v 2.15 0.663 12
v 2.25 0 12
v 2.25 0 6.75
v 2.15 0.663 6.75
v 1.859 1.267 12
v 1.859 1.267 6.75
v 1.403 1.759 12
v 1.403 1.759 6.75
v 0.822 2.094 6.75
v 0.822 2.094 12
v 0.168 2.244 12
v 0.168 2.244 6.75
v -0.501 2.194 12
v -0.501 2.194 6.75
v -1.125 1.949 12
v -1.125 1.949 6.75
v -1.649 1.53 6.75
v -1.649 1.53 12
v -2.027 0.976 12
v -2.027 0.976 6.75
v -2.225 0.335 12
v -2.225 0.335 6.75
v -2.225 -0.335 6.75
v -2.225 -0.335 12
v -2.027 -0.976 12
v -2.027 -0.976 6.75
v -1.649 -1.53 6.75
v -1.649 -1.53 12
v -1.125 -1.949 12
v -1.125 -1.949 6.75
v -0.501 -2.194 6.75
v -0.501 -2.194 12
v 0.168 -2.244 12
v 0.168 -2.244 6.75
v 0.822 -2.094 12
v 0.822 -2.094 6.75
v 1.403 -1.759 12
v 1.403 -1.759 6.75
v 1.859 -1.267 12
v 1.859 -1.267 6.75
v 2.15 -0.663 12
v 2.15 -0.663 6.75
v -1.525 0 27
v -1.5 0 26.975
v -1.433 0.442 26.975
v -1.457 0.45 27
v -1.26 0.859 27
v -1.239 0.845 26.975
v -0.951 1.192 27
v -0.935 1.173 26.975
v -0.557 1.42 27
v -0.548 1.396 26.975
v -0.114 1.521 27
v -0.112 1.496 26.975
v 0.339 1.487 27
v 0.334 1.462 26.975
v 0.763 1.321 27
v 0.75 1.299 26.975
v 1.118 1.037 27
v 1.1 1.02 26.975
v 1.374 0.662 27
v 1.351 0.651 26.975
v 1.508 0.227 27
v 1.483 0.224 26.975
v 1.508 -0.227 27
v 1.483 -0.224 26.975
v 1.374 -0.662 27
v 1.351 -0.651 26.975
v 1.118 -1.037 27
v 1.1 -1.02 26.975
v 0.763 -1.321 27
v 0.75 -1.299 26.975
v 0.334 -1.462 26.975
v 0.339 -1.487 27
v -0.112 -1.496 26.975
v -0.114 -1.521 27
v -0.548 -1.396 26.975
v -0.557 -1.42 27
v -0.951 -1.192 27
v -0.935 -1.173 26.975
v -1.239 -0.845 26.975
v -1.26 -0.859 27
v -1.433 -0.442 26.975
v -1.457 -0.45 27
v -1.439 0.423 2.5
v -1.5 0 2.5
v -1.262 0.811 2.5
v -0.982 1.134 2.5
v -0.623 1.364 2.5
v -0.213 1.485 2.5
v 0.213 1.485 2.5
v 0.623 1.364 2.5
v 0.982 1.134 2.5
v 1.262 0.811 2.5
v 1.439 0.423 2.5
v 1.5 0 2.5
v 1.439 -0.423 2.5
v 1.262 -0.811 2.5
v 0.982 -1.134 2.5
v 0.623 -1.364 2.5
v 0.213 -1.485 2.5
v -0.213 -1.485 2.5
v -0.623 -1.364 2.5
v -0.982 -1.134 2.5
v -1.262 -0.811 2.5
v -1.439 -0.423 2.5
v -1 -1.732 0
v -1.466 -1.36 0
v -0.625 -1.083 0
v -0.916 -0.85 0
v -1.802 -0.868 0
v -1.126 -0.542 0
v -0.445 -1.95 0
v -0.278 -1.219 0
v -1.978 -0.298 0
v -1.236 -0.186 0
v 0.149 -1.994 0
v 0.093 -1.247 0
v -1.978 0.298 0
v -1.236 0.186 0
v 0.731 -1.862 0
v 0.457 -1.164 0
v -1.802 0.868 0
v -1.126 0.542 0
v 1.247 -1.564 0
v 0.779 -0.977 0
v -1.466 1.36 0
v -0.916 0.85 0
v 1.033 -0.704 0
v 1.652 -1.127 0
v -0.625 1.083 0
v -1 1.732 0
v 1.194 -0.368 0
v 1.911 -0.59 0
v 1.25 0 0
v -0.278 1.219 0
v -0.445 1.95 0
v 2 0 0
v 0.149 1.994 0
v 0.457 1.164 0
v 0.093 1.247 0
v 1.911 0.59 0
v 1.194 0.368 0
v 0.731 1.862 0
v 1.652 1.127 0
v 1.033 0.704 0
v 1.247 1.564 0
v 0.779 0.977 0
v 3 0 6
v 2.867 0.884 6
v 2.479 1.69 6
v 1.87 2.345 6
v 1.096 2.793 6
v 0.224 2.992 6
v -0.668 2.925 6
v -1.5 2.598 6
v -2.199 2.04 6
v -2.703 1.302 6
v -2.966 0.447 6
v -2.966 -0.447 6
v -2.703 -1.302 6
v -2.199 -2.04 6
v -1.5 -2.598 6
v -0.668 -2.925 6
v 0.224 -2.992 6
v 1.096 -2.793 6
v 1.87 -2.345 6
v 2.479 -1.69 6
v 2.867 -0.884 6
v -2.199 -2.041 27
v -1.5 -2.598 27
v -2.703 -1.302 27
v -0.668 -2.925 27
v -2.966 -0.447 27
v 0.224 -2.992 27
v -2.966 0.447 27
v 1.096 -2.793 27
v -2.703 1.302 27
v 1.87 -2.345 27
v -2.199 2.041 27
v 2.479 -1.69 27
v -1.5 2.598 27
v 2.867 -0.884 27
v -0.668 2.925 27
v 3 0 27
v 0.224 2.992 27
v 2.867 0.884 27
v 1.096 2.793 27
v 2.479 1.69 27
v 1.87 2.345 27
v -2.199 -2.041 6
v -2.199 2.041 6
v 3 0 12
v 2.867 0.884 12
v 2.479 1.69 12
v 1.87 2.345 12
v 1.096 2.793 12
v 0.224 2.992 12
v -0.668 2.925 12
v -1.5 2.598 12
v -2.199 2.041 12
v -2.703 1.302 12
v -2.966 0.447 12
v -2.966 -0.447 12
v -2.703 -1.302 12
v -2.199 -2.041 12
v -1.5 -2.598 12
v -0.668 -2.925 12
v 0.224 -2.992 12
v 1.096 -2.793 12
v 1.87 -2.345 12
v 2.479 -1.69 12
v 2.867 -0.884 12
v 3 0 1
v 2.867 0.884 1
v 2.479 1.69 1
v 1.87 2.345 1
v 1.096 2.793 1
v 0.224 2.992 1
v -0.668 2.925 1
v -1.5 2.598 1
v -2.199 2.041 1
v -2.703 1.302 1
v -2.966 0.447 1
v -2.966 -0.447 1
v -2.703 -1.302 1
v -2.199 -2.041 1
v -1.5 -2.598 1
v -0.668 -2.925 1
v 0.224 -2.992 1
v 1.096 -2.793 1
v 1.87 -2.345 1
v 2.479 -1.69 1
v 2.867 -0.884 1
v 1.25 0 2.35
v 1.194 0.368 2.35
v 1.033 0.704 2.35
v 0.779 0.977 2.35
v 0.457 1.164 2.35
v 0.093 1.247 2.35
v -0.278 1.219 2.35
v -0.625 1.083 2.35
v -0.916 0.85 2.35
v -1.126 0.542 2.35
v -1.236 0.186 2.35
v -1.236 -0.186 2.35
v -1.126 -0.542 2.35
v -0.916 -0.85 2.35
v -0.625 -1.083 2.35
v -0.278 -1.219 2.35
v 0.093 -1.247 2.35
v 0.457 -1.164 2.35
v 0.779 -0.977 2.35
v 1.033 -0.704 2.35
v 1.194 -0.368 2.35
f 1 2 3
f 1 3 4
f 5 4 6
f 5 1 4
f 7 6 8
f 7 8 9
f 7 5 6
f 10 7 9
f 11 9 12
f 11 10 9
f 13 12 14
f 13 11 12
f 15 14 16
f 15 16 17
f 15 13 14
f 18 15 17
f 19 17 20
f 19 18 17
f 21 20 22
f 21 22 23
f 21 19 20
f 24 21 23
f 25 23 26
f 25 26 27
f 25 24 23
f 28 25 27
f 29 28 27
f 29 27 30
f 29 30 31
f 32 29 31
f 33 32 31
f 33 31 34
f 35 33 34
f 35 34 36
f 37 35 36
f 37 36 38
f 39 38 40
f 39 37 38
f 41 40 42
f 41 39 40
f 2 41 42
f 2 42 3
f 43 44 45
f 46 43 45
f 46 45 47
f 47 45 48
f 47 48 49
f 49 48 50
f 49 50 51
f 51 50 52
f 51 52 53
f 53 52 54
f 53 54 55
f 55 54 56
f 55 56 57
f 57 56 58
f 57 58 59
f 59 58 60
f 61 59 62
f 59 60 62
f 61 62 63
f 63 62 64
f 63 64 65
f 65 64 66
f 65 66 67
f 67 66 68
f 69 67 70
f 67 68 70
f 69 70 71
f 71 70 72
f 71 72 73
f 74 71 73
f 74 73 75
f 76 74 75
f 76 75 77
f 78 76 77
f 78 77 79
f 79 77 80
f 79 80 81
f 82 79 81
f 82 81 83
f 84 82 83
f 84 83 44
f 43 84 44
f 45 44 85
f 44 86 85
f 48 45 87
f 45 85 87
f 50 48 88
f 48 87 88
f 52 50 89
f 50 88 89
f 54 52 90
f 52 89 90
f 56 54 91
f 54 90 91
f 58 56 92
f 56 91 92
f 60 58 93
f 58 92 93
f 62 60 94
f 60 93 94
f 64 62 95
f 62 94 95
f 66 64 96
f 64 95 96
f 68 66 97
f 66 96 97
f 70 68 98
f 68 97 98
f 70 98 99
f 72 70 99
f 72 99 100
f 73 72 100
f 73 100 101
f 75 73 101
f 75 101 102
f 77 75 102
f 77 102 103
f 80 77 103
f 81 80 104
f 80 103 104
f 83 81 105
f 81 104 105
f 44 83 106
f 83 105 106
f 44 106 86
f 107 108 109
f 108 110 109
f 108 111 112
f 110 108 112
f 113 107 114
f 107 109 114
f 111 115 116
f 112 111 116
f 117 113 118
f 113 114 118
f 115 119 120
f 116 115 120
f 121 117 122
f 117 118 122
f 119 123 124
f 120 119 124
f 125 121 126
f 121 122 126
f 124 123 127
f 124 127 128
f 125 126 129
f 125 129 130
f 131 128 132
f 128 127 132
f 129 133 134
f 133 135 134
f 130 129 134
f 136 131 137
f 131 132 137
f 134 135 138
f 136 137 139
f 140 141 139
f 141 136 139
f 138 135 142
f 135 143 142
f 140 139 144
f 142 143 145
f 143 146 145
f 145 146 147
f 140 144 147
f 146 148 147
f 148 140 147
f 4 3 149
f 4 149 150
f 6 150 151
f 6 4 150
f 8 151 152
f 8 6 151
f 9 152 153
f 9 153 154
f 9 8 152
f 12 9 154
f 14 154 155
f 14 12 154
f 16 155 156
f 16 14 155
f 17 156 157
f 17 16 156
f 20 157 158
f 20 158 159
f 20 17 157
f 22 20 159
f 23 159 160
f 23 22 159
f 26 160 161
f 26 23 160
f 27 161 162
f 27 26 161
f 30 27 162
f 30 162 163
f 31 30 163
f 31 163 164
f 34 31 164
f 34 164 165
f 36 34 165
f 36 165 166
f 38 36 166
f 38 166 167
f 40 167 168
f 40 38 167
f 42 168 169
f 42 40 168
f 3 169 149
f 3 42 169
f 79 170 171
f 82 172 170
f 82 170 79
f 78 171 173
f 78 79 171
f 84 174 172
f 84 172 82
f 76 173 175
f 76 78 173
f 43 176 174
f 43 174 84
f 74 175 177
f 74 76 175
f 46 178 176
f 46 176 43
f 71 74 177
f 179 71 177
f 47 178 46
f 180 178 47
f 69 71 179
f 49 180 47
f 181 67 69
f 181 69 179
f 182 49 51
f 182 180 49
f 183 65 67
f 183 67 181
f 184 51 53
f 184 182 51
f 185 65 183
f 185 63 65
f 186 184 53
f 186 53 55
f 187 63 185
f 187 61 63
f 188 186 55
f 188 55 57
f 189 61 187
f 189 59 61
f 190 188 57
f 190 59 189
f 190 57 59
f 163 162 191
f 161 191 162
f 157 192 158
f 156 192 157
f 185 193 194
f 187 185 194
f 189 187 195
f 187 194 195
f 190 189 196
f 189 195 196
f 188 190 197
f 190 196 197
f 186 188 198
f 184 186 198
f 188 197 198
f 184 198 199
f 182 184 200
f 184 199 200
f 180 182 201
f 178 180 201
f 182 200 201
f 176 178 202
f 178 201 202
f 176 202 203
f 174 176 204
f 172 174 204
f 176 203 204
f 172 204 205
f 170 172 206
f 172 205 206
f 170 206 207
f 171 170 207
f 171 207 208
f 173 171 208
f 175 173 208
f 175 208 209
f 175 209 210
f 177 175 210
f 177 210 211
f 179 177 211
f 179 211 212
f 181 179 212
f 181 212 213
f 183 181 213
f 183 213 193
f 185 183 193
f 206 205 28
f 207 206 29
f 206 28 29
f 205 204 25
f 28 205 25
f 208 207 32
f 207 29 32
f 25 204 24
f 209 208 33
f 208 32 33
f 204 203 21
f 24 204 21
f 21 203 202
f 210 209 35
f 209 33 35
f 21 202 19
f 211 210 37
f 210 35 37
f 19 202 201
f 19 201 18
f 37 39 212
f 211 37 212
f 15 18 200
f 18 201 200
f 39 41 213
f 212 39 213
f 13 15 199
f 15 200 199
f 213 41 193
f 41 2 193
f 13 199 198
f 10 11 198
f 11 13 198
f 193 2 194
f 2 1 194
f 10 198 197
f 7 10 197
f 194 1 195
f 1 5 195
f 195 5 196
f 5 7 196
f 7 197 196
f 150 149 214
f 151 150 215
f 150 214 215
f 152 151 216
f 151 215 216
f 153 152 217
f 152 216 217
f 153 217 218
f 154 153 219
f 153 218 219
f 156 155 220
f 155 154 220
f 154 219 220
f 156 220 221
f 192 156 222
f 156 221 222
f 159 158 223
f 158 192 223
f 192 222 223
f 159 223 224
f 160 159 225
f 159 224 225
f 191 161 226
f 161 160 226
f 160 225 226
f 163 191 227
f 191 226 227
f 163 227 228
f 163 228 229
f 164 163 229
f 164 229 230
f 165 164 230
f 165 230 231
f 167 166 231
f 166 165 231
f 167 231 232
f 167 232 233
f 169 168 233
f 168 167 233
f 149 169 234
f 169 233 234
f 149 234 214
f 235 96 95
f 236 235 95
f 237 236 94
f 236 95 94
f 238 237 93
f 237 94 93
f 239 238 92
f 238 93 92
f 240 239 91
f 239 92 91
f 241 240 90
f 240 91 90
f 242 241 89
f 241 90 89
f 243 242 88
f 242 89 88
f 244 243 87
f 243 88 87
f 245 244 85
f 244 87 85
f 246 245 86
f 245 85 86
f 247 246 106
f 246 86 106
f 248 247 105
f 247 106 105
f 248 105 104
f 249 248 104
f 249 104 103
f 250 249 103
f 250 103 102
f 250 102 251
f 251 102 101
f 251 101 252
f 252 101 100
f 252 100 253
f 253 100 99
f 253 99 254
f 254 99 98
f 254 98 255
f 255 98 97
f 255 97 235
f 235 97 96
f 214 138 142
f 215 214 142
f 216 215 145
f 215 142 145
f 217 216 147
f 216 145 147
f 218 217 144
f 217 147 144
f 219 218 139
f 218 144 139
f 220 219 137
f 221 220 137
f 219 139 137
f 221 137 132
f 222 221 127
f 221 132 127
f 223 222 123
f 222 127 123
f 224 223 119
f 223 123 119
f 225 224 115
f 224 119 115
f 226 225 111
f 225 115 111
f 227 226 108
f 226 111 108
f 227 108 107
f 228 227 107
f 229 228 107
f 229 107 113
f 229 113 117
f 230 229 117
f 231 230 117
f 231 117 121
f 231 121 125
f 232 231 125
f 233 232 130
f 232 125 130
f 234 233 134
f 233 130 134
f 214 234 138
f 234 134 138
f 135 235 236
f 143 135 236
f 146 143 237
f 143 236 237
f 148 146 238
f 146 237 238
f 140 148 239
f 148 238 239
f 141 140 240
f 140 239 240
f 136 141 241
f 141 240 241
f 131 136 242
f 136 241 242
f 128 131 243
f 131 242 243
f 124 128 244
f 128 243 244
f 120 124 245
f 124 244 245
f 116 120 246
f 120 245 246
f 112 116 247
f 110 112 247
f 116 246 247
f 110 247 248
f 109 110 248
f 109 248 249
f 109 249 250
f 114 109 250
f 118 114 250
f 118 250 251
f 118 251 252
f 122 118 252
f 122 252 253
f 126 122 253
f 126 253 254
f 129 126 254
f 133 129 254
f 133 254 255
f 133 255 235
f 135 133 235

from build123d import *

# Parameters (mm, degrees)
ESQUISSE1_R                             = 3
BOSS_EXTRU_1_DEPTH                      = 27
DIAM_TRE_DU_PER_AGE_3_0_3_1_D           = 3
DIAM_TRE_DU_PER_AGE_3_0_3_1_DEPTH       = 24.5
DIAM_TRE_DU_PER_AGE_3_0_3_1_CSINK_D     = 3.05
DIAM_TRE_DU_PER_AGE_3_0_3_1_CSINK_ANGLE = 90
DIAM_TRE_DU_PER_AGE_3_0_3_1_TIP         = 0.901290929
DIAM_TRE_DU_PER_AGE_2_5_2_5_1_D         = 2.5
DIAM_TRE_DU_PER_AGE_2_5_2_5_1_DEPTH     = 2.5
DIAM_TRE_DU_PER_AGE_2_5_2_5_1_TIP       = 0.751075774
ENL_V_START                             = -15
ESQUISSE8_W                             = 10.37088702
ESQUISSE8_H                             = 7.120487756
ESQUISSE8_R                             = 2.25
ENL_V_MAT_EXTRU_1_DEPTH                 = 6
CHANFREIN1_SIZE                         = 1
CHANFREIN2_SIZE                         = 0.75


with BuildPart() as part:
    # Esquisse1 → Boss.-Extru.1 (new body)
    with BuildSketch(Plane.XY):
        Circle(ESQUISSE1_R)
    extrude(amount=BOSS_EXTRU_1_DEPTH)

    # Diamètre du perçage Ø3.0 (3)1
    with Locations(Plane.XY.offset(27)):
        with Locations((0, 0)):
            CounterSinkHole(DIAM_TRE_DU_PER_AGE_3_0_3_1_D / 2, DIAM_TRE_DU_PER_AGE_3_0_3_1_CSINK_D / 2, depth=DIAM_TRE_DU_PER_AGE_3_0_3_1_DEPTH, counter_sink_angle=DIAM_TRE_DU_PER_AGE_3_0_3_1_CSINK_ANGLE)
            with Locations((0, 0, -(DIAM_TRE_DU_PER_AGE_3_0_3_1_DEPTH + DIAM_TRE_DU_PER_AGE_3_0_3_1_TIP / 2))):  # 118° drill point
                Cone(0, DIAM_TRE_DU_PER_AGE_3_0_3_1_D / 2, DIAM_TRE_DU_PER_AGE_3_0_3_1_TIP, mode=Mode.SUBTRACT)

    # Diamètre du perçage Ø2.5 (2.5)1
    with Locations(Plane(origin=(0, 0, 0), x_dir=(-1, 0, 0), z_dir=(0, 0, -1))):
        with Locations((0, 0)):
            Hole(DIAM_TRE_DU_PER_AGE_2_5_2_5_1_D / 2, depth=DIAM_TRE_DU_PER_AGE_2_5_2_5_1_DEPTH)
            with Locations((0, 0, -(DIAM_TRE_DU_PER_AGE_2_5_2_5_1_DEPTH + DIAM_TRE_DU_PER_AGE_2_5_2_5_1_TIP / 2))):  # 118° drill point
                Cone(0, DIAM_TRE_DU_PER_AGE_2_5_2_5_1_D / 2, DIAM_TRE_DU_PER_AGE_2_5_2_5_1_TIP, mode=Mode.SUBTRACT)

    # Esquisse8 → Enlèv. mat.-Extru.1 (cut)
    with BuildSketch(Plane.XY.offset(27).offset(ENL_V_START)):
        with Locations((-0.50743182, -0.050962128)):
            Rectangle(ESQUISSE8_W, ESQUISSE8_H)
        Circle(ESQUISSE8_R, mode=Mode.SUBTRACT)
    extrude(amount=-ENL_V_MAT_EXTRU_1_DEPTH, mode=Mode.SUBTRACT)

    # Chanfrein1
    chanfrein1_edges = [part.edges().sort_by_distance(p)[0] for p in [
        (-3, 0, 0),
    ]]
    chamfer(chanfrein1_edges, length=CHANFREIN1_SIZE)

    # Chanfrein2
    chanfrein2_edges = [part.edges().sort_by_distance(p)[0] for p in [
        (-2.25, 0, 6),
    ]]
    chamfer(chanfrein2_edges, length=CHANFREIN2_SIZE - 0.0001)  # a hair under: the kernel refuses the full size


solid = part.part
